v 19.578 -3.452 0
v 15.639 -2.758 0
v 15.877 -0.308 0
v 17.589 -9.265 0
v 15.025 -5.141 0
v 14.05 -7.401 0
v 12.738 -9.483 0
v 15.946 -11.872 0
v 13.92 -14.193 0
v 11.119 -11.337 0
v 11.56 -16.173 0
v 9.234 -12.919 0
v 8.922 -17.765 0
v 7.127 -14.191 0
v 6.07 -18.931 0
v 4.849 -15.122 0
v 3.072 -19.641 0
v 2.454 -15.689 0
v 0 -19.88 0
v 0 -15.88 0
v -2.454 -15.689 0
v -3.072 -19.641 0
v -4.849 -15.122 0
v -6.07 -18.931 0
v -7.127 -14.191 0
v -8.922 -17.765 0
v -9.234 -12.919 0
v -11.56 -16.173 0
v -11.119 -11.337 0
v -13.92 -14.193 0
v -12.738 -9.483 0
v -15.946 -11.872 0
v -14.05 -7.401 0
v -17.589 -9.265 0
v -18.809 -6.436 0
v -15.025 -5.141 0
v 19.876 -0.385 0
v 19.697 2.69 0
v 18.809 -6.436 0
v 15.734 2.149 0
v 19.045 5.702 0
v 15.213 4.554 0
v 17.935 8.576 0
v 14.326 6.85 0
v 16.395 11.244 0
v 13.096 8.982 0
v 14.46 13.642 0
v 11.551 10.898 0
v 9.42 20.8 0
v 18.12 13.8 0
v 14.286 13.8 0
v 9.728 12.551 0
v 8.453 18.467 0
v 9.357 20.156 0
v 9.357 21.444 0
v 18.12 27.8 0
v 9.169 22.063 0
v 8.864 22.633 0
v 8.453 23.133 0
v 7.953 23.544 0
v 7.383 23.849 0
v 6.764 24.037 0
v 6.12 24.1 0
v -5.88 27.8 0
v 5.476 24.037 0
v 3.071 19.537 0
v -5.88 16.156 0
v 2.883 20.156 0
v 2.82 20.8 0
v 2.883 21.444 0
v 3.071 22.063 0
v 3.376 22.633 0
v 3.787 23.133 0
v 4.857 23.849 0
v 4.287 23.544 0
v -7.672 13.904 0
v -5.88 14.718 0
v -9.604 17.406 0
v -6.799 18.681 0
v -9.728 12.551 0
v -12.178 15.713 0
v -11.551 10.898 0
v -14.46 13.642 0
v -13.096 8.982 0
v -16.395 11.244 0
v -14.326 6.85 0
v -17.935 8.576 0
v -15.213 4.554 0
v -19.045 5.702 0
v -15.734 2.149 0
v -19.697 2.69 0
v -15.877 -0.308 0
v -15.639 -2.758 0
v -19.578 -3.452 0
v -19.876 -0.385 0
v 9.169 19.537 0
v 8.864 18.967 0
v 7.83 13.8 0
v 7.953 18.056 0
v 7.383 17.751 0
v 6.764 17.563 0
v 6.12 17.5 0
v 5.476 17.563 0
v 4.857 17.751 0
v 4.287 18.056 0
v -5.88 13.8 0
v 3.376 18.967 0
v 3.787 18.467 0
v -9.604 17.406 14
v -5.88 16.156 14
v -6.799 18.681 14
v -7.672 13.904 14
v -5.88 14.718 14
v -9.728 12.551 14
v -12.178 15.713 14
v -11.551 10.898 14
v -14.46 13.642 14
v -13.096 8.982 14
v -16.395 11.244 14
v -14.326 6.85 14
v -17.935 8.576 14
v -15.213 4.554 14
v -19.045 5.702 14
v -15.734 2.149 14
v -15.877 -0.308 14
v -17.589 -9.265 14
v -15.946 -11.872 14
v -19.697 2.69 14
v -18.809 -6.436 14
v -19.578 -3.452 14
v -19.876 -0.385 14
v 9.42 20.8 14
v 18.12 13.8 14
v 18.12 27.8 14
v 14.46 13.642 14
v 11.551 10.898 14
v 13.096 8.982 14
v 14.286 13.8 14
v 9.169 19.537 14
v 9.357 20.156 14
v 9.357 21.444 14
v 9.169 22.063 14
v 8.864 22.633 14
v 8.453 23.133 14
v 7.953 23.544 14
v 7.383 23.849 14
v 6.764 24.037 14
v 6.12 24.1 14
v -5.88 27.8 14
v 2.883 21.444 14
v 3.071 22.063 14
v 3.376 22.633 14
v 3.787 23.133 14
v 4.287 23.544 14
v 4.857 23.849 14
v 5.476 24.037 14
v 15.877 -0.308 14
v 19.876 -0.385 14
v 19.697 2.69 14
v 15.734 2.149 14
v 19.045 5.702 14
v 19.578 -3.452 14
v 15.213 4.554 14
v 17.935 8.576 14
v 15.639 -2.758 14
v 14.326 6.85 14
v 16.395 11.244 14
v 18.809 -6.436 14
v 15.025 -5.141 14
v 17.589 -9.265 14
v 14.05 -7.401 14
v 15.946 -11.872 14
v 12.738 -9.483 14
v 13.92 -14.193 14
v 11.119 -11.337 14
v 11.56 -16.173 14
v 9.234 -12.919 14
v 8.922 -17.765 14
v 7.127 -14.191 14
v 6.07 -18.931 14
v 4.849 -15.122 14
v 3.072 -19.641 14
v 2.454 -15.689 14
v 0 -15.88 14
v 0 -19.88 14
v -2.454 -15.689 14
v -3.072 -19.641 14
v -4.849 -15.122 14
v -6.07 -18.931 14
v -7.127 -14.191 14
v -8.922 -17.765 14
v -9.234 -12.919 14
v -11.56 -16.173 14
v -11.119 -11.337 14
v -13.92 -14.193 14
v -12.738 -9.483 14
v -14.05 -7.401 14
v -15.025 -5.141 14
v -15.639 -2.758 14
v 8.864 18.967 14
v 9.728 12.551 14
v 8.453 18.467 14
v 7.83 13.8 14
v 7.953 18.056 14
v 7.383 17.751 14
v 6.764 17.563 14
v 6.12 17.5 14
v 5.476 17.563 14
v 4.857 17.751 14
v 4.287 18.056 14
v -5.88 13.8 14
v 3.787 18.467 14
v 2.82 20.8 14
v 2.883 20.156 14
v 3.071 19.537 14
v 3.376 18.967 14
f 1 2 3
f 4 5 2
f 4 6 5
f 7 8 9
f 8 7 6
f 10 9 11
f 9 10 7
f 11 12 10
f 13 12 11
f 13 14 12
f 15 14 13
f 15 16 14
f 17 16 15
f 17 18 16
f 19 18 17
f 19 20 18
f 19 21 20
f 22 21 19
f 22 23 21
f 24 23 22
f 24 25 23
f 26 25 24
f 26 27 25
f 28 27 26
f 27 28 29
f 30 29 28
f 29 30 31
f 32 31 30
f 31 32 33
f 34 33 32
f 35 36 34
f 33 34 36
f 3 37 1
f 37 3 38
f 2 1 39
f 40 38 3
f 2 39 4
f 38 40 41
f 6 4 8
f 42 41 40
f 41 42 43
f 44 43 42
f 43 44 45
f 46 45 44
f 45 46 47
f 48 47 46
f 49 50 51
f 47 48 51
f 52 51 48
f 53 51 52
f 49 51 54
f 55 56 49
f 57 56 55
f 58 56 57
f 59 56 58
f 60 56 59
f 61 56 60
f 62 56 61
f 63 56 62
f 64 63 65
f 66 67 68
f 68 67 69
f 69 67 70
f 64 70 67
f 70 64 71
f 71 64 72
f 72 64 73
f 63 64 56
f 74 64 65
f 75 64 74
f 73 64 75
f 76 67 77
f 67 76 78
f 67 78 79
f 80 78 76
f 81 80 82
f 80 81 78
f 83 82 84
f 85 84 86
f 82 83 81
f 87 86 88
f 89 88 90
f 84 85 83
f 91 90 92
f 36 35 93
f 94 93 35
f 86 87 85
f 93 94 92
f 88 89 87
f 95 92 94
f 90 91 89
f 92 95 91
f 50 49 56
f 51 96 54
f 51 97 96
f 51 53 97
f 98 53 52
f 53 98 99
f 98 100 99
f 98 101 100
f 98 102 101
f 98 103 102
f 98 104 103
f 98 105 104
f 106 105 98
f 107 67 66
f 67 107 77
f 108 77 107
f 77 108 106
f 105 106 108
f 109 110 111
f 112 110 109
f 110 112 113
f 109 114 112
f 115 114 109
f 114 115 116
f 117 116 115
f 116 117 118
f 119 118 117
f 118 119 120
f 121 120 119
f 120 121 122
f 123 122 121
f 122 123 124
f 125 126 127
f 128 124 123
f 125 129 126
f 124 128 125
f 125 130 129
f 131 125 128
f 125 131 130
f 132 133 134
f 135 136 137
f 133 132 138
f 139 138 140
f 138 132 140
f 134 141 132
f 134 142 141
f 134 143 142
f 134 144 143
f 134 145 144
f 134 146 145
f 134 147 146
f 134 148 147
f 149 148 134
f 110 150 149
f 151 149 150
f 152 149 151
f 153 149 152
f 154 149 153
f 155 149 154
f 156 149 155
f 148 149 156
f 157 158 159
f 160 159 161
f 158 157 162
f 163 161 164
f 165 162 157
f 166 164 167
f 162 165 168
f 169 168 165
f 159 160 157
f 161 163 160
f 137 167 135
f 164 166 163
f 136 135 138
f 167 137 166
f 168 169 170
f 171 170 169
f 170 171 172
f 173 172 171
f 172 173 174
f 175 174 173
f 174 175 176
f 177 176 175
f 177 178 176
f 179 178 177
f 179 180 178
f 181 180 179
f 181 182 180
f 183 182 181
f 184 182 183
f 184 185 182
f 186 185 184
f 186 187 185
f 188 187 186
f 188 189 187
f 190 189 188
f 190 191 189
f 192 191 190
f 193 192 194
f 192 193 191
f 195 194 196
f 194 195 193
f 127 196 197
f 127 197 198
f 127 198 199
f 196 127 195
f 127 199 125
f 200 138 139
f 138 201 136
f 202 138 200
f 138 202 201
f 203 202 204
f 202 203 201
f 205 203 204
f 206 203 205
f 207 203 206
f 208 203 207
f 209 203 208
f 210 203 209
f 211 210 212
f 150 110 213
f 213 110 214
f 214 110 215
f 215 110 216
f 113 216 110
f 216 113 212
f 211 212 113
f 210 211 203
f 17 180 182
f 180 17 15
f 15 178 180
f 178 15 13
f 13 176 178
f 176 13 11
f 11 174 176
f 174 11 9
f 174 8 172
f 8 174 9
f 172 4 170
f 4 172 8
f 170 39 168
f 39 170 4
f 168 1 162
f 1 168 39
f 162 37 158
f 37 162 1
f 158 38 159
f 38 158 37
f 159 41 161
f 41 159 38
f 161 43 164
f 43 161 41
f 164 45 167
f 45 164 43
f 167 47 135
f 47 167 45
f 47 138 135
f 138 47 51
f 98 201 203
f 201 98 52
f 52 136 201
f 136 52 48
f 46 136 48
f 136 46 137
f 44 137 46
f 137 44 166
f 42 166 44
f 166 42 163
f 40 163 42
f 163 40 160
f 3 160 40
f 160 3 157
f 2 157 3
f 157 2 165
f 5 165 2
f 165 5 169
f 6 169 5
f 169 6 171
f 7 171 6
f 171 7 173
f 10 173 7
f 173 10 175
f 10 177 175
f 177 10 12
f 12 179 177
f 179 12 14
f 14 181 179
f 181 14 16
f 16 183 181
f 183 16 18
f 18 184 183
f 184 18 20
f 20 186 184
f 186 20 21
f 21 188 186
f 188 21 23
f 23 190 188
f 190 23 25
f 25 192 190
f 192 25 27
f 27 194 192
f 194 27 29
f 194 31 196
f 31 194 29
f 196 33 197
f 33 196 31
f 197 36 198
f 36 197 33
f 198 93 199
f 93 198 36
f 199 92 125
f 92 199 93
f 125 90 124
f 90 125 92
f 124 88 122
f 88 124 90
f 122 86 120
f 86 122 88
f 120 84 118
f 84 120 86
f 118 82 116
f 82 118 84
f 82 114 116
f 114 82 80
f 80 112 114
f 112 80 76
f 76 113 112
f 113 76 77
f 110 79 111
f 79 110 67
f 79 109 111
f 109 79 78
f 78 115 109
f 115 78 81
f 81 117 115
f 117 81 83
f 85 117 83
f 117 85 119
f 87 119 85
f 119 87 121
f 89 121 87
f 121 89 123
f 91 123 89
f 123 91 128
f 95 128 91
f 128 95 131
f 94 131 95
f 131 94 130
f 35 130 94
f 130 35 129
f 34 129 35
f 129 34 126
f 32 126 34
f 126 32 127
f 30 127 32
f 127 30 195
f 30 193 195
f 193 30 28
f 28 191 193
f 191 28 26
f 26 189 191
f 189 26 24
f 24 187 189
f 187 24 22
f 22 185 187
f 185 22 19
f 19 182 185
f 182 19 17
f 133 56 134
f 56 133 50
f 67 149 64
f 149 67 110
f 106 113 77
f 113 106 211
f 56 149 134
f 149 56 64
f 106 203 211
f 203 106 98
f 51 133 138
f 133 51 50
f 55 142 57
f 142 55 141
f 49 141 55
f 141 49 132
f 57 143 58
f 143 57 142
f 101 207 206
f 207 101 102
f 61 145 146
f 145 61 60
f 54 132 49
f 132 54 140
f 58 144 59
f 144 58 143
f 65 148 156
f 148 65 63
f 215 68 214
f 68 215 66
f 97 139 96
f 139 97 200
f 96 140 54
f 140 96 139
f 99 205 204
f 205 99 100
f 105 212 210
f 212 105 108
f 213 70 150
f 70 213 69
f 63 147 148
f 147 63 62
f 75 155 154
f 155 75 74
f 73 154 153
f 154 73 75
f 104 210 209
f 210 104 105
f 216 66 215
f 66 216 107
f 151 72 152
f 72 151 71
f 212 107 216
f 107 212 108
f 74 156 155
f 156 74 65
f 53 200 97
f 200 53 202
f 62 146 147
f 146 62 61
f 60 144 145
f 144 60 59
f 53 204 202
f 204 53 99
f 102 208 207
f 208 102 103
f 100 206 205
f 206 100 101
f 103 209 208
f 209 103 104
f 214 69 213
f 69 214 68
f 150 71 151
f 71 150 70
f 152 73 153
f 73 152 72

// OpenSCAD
$fn = 32;

// ----------------------------------------------------------------------
// Pipe clamp: 39.76 mm ring, 4 mm wall, 14 mm wide
// ----------------------------------------------------------------------

// --- parameters (mm) ---
outer_r = 19.88;          // clamp outside radius
inner_r = 15.88;          // pipe bore radius
band = 4;                 // band thickness
clamp_w = 14;             // clamp width
opening = 40;             // opening angle between the ends
lug_w = 24;               // lug width
lug_len = 14;             // lug length
bolt_d = 6.6;             // bolt hole

clamp_profile = [[-6.799, 18.681], [-9.604, 17.406], [-12.178, 15.713], [-14.46, 13.642], [-16.395, 11.244], [-17.935, 8.576], [-19.045, 5.702], [-19.697, 2.69], [-19.876, -0.385], [-19.578, -3.452], [-18.809, -6.436], [-17.589, -9.265], [-15.946, -11.872], [-13.92, -14.193], [-11.56, -16.173], [-8.922, -17.765], [-6.07, -18.931], [-3.072, -19.641], [0, -19.88], [3.072, -19.641], [6.07, -18.931], [8.922, -17.765], [11.56, -16.173], [13.92, -14.193], [15.946, -11.872], [17.589, -9.265], [18.809, -6.436], [19.578, -3.452], [19.876, -0.385], [19.697, 2.69], [19.045, 5.702], [17.935, 8.576], [16.395, 11.244], [14.46, 13.642], [12.178, 15.713], [9.604, 17.406], [6.799, 18.681], [5.431, 14.922], [7.672, 13.904], [9.728, 12.551], [11.551, 10.898], [13.096, 8.982], [14.326, 6.85], [15.213, 4.554], [15.734, 2.149], [15.877, -0.308], [15.639, -2.758], [15.025, -5.141], [14.05, -7.401], [12.738, -9.483], [11.119, -11.337], [9.234, -12.919], [7.127, -14.191], [4.849, -15.122], [2.454, -15.689], [0, -15.88], [-2.454, -15.689], [-4.849, -15.122], [-7.127, -14.191], [-9.234, -12.919], [-11.119, -11.337], [-12.738, -9.483], [-14.05, -7.401], [-15.025, -5.141], [-15.639, -2.758], [-15.877, -0.308], [-15.734, 2.149], [-15.213, 4.554], [-14.326, 6.85], [-13.096, 8.982], [-11.551, 10.898], [-9.728, 12.551], [-7.672, 13.904], [-5.431, 14.922]];

difference() {
  union() {
    linear_extrude(height = clamp_w) polygon(clamp_profile);
    /* bolt lug on the other end */
    translate([-5.88, 13.8, 0]) cube([lug_w, 14, clamp_w]);
  }
  translate([6.12, 20.8, -2.5]) cylinder(h = clamp_w + 5, d = bolt_d);
}
